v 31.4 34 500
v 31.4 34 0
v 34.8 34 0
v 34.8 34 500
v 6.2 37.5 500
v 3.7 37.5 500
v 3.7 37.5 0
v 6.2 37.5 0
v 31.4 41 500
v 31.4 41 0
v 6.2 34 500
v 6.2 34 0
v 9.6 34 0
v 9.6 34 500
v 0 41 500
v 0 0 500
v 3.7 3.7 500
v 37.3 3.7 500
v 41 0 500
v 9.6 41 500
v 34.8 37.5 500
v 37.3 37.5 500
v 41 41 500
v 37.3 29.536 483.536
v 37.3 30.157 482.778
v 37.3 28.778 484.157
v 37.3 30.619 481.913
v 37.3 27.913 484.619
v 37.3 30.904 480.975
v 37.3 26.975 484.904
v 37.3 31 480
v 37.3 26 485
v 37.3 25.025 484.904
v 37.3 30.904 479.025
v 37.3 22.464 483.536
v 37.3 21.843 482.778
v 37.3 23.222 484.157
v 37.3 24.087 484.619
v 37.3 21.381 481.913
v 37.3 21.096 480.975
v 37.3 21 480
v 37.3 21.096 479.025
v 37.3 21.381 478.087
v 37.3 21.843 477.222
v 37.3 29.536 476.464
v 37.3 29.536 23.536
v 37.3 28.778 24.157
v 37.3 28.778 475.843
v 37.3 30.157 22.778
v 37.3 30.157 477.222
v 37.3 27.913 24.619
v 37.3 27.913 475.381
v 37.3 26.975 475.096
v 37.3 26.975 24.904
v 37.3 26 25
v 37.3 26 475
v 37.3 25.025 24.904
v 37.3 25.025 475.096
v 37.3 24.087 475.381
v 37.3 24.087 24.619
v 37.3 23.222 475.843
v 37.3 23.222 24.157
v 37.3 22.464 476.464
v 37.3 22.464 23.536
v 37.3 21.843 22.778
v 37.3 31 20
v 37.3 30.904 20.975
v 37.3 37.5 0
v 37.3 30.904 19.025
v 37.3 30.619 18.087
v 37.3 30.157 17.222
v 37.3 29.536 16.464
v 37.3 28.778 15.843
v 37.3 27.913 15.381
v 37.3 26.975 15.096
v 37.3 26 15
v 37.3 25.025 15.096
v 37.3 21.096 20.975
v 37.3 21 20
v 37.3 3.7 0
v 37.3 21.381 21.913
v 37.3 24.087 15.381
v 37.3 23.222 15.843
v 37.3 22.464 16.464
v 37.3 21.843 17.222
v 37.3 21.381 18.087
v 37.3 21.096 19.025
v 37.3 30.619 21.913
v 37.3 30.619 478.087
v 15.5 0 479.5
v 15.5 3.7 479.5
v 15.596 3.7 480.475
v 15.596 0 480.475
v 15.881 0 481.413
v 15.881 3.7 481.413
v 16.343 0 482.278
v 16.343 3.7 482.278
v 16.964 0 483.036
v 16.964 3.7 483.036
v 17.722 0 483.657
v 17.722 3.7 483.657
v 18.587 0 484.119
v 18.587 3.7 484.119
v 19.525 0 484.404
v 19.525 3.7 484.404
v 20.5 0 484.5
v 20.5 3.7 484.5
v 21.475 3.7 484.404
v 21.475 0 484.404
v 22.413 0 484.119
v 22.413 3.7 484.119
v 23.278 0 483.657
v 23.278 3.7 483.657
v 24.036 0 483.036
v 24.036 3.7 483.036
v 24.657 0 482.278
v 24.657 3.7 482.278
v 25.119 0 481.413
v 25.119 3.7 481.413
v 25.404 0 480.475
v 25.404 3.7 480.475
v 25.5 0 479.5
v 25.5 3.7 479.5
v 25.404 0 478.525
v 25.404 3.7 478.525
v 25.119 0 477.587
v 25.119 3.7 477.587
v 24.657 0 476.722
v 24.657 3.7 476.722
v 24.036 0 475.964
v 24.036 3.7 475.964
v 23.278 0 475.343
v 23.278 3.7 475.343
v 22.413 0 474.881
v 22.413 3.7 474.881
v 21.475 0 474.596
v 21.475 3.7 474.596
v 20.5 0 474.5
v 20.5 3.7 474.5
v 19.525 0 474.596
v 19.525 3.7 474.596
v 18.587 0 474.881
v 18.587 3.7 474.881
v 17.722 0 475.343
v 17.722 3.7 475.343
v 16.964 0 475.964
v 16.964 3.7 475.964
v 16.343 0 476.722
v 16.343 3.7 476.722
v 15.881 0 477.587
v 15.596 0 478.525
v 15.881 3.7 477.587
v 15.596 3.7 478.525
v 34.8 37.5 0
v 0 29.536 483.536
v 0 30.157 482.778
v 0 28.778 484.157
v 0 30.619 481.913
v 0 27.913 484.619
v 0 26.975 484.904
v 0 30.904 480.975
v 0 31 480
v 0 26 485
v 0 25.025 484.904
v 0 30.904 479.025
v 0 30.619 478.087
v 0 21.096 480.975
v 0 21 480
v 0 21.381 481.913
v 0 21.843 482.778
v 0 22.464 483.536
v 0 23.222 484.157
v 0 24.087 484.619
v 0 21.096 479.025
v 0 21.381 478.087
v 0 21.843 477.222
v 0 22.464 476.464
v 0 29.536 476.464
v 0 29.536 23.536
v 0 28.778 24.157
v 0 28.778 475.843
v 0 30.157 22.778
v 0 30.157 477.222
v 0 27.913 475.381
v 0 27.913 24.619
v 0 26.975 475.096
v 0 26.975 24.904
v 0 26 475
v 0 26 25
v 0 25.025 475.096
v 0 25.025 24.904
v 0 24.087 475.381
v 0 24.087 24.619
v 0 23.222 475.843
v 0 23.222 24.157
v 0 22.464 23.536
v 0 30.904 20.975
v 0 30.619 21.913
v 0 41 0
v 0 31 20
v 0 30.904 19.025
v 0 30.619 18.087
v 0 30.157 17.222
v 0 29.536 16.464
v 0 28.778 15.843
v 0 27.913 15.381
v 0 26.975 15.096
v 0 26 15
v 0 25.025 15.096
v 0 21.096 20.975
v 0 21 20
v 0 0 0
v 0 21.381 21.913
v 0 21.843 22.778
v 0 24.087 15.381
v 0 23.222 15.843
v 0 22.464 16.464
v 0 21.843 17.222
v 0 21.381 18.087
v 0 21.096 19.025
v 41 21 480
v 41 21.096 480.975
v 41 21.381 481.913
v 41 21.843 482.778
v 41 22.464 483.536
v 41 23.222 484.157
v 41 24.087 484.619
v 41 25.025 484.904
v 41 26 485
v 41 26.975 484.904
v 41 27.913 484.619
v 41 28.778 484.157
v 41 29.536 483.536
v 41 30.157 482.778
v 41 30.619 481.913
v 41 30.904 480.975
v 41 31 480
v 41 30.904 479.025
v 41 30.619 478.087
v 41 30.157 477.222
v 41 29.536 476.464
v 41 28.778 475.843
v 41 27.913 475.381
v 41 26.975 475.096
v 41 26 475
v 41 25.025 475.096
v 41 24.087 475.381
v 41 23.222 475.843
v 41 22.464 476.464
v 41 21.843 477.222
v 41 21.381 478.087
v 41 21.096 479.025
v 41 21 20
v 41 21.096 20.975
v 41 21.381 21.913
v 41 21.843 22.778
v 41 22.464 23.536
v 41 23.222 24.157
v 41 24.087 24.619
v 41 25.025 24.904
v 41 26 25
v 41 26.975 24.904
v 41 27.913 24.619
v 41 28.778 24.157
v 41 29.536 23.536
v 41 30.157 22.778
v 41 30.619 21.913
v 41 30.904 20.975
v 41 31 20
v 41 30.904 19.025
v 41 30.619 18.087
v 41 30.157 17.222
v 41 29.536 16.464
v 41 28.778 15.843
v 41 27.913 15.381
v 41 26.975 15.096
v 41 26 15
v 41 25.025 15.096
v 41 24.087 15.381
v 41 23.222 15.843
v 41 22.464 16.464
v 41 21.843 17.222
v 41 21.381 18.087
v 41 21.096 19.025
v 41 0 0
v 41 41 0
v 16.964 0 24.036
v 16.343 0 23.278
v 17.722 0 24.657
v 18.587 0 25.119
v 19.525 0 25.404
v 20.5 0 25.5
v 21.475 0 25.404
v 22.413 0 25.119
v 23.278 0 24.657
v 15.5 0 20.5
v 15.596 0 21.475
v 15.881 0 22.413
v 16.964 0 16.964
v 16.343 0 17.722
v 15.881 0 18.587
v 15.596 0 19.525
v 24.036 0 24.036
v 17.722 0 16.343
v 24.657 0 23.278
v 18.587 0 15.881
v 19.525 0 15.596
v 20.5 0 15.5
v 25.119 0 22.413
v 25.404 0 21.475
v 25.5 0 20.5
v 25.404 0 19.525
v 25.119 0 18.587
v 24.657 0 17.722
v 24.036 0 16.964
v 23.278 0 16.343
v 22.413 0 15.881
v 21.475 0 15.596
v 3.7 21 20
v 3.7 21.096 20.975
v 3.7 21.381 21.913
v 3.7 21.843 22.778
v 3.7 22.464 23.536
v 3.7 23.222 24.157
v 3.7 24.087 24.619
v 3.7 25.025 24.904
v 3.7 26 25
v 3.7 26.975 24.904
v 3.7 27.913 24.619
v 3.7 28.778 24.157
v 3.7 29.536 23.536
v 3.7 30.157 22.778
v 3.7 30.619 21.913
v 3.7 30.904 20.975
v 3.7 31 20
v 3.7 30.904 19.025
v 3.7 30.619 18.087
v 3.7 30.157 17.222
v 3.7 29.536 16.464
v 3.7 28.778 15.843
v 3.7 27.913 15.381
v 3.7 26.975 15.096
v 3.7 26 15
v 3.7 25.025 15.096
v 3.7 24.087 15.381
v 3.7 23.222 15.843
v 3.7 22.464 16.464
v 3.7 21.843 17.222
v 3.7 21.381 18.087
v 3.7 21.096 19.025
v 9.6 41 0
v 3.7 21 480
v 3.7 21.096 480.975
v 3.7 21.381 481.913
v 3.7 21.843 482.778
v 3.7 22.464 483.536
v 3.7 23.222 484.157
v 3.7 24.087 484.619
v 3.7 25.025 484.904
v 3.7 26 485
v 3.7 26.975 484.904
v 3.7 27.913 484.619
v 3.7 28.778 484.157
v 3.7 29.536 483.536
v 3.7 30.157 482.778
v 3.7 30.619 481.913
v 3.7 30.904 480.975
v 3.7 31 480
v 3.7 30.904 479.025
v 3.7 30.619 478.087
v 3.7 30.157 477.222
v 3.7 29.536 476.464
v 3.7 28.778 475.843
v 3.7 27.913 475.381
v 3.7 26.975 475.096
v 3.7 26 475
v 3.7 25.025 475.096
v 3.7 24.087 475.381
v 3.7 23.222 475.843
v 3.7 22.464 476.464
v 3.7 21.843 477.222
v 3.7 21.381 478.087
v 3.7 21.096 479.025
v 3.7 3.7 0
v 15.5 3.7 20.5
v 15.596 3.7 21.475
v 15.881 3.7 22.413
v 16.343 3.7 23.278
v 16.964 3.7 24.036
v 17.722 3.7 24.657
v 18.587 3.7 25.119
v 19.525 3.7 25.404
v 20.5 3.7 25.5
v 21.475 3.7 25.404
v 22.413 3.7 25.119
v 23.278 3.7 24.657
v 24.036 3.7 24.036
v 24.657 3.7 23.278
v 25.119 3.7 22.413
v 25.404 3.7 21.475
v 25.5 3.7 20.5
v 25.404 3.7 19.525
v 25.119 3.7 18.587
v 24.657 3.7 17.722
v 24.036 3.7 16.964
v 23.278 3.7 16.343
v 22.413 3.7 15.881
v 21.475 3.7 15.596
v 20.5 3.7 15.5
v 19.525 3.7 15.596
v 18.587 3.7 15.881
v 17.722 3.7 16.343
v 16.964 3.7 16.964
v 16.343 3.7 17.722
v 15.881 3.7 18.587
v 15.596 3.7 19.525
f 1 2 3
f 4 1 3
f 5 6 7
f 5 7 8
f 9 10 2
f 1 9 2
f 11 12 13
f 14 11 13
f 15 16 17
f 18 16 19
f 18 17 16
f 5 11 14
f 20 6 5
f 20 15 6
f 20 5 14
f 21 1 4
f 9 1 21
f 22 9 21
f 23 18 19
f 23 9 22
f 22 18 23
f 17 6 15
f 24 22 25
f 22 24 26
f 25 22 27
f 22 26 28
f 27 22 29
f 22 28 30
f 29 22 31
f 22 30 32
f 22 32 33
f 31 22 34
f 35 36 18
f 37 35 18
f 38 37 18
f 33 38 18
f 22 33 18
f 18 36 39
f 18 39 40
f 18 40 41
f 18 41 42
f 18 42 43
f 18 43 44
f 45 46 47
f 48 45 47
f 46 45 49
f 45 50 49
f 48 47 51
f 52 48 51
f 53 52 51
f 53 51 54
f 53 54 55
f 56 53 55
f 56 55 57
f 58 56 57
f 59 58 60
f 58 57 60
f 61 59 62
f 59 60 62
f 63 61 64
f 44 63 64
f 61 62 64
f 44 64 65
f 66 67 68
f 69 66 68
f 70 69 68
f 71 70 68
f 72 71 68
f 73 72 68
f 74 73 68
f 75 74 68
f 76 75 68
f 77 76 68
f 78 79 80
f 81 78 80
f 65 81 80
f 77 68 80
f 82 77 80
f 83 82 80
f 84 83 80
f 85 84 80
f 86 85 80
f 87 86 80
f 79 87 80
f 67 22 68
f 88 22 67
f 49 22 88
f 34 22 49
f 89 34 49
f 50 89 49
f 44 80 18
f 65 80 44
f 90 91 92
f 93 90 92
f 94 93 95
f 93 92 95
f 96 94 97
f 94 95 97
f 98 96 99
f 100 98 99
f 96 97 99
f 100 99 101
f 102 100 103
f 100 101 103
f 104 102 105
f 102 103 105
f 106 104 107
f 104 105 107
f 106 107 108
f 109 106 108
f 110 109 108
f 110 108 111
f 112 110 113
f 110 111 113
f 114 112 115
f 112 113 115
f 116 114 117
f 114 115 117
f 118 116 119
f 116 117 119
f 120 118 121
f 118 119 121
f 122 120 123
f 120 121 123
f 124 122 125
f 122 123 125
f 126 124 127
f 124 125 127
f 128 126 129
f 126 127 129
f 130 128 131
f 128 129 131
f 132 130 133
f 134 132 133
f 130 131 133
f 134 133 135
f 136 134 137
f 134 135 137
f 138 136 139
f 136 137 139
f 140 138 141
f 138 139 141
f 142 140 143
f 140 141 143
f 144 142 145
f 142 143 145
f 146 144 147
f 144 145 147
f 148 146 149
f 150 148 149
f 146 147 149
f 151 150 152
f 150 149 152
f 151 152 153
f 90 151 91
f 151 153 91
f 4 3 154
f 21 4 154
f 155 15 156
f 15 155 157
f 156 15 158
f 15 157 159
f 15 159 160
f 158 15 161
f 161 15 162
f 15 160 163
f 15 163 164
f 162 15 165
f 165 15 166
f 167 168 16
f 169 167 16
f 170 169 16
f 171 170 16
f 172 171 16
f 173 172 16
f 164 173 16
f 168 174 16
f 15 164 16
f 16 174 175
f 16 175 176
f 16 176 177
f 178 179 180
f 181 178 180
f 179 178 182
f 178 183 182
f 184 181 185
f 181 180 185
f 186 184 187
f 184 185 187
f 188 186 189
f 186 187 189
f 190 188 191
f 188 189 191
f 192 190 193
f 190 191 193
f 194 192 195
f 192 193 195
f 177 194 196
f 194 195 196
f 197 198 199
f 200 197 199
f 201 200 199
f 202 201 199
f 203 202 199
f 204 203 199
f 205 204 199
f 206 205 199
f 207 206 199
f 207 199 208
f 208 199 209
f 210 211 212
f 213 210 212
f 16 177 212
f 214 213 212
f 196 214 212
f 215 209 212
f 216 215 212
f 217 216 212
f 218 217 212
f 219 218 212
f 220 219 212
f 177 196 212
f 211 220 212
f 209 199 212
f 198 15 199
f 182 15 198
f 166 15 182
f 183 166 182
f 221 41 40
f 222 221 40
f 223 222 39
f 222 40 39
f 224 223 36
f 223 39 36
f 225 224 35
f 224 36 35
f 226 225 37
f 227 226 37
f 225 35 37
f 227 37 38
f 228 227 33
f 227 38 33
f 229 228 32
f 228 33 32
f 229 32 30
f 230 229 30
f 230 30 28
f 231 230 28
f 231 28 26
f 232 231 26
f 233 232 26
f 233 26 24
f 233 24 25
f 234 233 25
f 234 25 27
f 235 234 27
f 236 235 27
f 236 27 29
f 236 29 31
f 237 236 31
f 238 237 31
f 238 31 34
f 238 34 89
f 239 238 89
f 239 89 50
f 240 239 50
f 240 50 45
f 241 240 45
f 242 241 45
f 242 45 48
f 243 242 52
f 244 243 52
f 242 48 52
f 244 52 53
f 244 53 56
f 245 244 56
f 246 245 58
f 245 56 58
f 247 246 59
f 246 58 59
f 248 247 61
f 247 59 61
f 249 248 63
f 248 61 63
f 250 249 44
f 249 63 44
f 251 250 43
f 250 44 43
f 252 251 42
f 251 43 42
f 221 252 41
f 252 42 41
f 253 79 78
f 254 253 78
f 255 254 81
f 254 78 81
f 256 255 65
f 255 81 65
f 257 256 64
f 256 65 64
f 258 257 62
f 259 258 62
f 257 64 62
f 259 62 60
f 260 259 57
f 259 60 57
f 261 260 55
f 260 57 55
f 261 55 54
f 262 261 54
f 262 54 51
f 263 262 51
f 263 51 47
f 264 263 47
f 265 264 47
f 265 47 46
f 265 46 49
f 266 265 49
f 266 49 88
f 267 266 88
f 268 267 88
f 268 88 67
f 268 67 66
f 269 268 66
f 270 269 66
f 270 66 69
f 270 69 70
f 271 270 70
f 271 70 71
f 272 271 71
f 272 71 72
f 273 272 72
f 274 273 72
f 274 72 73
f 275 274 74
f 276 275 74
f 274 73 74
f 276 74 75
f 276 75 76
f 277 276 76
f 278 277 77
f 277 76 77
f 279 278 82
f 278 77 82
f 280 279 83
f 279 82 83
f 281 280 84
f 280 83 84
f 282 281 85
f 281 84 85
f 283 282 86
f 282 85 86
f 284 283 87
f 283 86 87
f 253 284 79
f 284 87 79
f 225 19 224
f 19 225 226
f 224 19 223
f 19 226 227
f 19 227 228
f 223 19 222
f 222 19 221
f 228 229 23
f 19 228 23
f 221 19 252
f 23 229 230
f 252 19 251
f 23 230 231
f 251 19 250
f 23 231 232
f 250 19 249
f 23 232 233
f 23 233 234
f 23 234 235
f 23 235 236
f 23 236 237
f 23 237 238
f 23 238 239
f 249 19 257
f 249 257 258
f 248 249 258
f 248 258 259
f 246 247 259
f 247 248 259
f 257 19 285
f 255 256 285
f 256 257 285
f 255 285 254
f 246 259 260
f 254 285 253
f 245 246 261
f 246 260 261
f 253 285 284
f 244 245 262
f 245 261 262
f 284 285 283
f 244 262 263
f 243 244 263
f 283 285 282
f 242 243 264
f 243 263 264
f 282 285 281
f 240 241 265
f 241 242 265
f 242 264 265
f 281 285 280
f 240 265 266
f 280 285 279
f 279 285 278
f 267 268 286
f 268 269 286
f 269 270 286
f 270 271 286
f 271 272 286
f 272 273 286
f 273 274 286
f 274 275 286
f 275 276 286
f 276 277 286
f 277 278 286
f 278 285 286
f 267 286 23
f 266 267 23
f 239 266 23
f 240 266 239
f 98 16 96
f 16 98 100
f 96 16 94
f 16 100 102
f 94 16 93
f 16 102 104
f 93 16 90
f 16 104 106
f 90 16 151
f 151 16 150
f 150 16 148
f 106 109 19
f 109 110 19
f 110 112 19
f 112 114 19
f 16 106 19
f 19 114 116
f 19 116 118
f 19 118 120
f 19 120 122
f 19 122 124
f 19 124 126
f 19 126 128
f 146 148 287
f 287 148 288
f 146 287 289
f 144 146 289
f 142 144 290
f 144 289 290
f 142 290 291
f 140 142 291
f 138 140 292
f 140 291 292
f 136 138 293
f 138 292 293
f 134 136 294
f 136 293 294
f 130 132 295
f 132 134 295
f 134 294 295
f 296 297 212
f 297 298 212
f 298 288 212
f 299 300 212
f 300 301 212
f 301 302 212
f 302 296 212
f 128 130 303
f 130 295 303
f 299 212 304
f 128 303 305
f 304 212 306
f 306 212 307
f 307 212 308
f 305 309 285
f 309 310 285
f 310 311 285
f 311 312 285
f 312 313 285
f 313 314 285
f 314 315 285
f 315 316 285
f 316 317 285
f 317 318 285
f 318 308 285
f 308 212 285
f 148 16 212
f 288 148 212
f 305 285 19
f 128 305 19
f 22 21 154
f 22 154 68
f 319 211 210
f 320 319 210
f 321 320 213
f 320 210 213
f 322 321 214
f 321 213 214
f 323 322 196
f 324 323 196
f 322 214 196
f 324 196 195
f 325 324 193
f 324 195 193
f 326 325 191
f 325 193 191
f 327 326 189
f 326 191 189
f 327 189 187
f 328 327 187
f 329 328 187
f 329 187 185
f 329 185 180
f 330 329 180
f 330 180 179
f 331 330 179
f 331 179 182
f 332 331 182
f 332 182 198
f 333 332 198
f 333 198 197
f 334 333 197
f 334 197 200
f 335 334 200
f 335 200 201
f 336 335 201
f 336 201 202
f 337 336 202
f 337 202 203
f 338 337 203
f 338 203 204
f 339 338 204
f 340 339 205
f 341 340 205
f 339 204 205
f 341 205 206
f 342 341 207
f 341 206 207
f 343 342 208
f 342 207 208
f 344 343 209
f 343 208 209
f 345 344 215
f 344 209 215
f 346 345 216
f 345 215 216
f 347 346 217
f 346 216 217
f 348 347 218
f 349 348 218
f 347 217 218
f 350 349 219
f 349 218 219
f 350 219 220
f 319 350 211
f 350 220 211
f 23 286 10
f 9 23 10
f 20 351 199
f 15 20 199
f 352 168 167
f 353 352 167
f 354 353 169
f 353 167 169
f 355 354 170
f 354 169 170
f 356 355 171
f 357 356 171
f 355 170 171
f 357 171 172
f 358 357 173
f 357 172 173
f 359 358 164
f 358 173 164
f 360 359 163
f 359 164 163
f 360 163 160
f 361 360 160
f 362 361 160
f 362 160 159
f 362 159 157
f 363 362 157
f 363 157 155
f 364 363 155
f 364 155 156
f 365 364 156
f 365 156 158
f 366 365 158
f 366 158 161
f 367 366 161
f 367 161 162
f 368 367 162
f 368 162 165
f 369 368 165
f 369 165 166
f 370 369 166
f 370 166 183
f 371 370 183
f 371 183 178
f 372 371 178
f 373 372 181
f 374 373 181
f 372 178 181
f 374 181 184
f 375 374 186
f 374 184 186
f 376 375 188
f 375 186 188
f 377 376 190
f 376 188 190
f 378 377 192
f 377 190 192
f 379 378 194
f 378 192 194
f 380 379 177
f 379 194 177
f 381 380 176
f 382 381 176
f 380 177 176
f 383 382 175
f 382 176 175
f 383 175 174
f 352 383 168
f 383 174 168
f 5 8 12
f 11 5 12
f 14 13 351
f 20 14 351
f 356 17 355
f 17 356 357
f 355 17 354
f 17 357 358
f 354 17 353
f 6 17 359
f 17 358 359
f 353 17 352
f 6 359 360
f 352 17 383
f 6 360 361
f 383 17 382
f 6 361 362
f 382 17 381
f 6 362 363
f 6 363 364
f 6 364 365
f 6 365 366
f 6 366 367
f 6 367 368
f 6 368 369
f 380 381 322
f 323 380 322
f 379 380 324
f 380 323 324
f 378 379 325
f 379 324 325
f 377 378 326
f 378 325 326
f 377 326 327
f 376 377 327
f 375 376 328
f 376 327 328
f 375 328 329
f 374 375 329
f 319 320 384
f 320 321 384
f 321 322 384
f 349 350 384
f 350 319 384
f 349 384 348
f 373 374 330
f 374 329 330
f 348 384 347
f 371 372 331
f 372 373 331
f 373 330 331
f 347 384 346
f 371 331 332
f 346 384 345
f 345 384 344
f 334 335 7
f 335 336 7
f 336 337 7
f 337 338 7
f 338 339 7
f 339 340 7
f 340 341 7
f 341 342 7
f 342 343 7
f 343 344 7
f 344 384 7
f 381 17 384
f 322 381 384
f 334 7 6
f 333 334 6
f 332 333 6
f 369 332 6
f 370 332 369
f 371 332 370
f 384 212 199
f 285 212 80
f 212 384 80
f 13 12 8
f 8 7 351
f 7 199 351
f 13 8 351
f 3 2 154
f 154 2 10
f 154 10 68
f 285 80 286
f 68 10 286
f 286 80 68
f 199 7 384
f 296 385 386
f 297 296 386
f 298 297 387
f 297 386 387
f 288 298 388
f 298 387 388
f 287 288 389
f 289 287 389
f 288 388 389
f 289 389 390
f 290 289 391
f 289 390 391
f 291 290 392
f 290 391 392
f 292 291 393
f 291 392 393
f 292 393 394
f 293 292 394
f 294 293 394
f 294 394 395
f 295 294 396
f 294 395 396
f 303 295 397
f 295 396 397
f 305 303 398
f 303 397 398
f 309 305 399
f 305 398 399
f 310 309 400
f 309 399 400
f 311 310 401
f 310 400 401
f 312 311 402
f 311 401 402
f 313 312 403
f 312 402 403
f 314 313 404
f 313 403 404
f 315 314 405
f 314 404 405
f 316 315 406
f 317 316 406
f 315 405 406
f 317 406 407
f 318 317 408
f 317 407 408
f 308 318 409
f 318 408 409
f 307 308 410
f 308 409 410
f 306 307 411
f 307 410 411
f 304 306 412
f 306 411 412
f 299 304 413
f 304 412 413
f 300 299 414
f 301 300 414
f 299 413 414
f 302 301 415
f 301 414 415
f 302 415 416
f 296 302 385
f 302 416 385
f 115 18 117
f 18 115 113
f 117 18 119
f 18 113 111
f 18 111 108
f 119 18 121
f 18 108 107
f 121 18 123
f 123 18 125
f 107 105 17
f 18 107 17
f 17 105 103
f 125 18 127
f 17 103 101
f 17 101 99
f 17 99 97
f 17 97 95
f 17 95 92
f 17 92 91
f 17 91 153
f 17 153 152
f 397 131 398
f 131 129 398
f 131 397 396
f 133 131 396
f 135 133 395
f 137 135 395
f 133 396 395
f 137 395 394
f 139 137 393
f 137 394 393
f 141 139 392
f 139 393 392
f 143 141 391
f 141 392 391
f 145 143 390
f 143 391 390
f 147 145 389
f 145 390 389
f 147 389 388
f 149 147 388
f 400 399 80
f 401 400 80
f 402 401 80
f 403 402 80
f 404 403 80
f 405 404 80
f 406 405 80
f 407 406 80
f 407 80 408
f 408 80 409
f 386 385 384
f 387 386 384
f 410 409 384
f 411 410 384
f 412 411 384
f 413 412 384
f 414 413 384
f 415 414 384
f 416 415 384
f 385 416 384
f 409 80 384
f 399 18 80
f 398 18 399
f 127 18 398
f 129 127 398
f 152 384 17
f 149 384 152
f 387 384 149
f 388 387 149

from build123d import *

# Parameters (mm, degrees)
F1_DEPTH = 500
F2_R     = 5
F3_DEPTH = 3.7
F4_R     = 5
F5_DEPTH = 41.001


with BuildPart() as f1:
    # F0 (on Top) → F1 (new body)
    with BuildSketch(Plane.XY):
        Polygon((0, 41), (0, 0), (41, 0), (41, 41), (31.4, 41), (31.4, 34), (34.8, 34), (34.8, 37.5), (37.3, 37.5), (37.3, 3.7), (3.7, 3.7), (3.7, 37.5), (6.2, 37.5), (6.2, 34), (9.6, 34), (9.6, 41), align=None)
    extrude(amount=F1_DEPTH)

    # F2 (on face) → F3 (cut, through all)
    with BuildSketch(Plane(origin=(0, 3.7, 0), x_dir=(-1, 0, 0), z_dir=(0, 1, 0))):
        with Locations((-20.5, 479.5)):
            Circle(F2_R)
        with Locations((-20.5, 20.5)):
            Circle(F2_R)
    extrude(amount=-F3_DEPTH, mode=Mode.SUBTRACT)

    # F4 (on face) → F5 (cut, through all)
    with BuildSketch(Plane(origin=(0, 0, 0), x_dir=(0, -1, 0), z_dir=(-1, 0, 0))):
        with Locations((-26, 20)):
            Circle(F4_R)
        with Locations((-26, 480)):
            Circle(F4_R)
    extrude(amount=-F5_DEPTH, mode=Mode.SUBTRACT)


solid = f1.part
